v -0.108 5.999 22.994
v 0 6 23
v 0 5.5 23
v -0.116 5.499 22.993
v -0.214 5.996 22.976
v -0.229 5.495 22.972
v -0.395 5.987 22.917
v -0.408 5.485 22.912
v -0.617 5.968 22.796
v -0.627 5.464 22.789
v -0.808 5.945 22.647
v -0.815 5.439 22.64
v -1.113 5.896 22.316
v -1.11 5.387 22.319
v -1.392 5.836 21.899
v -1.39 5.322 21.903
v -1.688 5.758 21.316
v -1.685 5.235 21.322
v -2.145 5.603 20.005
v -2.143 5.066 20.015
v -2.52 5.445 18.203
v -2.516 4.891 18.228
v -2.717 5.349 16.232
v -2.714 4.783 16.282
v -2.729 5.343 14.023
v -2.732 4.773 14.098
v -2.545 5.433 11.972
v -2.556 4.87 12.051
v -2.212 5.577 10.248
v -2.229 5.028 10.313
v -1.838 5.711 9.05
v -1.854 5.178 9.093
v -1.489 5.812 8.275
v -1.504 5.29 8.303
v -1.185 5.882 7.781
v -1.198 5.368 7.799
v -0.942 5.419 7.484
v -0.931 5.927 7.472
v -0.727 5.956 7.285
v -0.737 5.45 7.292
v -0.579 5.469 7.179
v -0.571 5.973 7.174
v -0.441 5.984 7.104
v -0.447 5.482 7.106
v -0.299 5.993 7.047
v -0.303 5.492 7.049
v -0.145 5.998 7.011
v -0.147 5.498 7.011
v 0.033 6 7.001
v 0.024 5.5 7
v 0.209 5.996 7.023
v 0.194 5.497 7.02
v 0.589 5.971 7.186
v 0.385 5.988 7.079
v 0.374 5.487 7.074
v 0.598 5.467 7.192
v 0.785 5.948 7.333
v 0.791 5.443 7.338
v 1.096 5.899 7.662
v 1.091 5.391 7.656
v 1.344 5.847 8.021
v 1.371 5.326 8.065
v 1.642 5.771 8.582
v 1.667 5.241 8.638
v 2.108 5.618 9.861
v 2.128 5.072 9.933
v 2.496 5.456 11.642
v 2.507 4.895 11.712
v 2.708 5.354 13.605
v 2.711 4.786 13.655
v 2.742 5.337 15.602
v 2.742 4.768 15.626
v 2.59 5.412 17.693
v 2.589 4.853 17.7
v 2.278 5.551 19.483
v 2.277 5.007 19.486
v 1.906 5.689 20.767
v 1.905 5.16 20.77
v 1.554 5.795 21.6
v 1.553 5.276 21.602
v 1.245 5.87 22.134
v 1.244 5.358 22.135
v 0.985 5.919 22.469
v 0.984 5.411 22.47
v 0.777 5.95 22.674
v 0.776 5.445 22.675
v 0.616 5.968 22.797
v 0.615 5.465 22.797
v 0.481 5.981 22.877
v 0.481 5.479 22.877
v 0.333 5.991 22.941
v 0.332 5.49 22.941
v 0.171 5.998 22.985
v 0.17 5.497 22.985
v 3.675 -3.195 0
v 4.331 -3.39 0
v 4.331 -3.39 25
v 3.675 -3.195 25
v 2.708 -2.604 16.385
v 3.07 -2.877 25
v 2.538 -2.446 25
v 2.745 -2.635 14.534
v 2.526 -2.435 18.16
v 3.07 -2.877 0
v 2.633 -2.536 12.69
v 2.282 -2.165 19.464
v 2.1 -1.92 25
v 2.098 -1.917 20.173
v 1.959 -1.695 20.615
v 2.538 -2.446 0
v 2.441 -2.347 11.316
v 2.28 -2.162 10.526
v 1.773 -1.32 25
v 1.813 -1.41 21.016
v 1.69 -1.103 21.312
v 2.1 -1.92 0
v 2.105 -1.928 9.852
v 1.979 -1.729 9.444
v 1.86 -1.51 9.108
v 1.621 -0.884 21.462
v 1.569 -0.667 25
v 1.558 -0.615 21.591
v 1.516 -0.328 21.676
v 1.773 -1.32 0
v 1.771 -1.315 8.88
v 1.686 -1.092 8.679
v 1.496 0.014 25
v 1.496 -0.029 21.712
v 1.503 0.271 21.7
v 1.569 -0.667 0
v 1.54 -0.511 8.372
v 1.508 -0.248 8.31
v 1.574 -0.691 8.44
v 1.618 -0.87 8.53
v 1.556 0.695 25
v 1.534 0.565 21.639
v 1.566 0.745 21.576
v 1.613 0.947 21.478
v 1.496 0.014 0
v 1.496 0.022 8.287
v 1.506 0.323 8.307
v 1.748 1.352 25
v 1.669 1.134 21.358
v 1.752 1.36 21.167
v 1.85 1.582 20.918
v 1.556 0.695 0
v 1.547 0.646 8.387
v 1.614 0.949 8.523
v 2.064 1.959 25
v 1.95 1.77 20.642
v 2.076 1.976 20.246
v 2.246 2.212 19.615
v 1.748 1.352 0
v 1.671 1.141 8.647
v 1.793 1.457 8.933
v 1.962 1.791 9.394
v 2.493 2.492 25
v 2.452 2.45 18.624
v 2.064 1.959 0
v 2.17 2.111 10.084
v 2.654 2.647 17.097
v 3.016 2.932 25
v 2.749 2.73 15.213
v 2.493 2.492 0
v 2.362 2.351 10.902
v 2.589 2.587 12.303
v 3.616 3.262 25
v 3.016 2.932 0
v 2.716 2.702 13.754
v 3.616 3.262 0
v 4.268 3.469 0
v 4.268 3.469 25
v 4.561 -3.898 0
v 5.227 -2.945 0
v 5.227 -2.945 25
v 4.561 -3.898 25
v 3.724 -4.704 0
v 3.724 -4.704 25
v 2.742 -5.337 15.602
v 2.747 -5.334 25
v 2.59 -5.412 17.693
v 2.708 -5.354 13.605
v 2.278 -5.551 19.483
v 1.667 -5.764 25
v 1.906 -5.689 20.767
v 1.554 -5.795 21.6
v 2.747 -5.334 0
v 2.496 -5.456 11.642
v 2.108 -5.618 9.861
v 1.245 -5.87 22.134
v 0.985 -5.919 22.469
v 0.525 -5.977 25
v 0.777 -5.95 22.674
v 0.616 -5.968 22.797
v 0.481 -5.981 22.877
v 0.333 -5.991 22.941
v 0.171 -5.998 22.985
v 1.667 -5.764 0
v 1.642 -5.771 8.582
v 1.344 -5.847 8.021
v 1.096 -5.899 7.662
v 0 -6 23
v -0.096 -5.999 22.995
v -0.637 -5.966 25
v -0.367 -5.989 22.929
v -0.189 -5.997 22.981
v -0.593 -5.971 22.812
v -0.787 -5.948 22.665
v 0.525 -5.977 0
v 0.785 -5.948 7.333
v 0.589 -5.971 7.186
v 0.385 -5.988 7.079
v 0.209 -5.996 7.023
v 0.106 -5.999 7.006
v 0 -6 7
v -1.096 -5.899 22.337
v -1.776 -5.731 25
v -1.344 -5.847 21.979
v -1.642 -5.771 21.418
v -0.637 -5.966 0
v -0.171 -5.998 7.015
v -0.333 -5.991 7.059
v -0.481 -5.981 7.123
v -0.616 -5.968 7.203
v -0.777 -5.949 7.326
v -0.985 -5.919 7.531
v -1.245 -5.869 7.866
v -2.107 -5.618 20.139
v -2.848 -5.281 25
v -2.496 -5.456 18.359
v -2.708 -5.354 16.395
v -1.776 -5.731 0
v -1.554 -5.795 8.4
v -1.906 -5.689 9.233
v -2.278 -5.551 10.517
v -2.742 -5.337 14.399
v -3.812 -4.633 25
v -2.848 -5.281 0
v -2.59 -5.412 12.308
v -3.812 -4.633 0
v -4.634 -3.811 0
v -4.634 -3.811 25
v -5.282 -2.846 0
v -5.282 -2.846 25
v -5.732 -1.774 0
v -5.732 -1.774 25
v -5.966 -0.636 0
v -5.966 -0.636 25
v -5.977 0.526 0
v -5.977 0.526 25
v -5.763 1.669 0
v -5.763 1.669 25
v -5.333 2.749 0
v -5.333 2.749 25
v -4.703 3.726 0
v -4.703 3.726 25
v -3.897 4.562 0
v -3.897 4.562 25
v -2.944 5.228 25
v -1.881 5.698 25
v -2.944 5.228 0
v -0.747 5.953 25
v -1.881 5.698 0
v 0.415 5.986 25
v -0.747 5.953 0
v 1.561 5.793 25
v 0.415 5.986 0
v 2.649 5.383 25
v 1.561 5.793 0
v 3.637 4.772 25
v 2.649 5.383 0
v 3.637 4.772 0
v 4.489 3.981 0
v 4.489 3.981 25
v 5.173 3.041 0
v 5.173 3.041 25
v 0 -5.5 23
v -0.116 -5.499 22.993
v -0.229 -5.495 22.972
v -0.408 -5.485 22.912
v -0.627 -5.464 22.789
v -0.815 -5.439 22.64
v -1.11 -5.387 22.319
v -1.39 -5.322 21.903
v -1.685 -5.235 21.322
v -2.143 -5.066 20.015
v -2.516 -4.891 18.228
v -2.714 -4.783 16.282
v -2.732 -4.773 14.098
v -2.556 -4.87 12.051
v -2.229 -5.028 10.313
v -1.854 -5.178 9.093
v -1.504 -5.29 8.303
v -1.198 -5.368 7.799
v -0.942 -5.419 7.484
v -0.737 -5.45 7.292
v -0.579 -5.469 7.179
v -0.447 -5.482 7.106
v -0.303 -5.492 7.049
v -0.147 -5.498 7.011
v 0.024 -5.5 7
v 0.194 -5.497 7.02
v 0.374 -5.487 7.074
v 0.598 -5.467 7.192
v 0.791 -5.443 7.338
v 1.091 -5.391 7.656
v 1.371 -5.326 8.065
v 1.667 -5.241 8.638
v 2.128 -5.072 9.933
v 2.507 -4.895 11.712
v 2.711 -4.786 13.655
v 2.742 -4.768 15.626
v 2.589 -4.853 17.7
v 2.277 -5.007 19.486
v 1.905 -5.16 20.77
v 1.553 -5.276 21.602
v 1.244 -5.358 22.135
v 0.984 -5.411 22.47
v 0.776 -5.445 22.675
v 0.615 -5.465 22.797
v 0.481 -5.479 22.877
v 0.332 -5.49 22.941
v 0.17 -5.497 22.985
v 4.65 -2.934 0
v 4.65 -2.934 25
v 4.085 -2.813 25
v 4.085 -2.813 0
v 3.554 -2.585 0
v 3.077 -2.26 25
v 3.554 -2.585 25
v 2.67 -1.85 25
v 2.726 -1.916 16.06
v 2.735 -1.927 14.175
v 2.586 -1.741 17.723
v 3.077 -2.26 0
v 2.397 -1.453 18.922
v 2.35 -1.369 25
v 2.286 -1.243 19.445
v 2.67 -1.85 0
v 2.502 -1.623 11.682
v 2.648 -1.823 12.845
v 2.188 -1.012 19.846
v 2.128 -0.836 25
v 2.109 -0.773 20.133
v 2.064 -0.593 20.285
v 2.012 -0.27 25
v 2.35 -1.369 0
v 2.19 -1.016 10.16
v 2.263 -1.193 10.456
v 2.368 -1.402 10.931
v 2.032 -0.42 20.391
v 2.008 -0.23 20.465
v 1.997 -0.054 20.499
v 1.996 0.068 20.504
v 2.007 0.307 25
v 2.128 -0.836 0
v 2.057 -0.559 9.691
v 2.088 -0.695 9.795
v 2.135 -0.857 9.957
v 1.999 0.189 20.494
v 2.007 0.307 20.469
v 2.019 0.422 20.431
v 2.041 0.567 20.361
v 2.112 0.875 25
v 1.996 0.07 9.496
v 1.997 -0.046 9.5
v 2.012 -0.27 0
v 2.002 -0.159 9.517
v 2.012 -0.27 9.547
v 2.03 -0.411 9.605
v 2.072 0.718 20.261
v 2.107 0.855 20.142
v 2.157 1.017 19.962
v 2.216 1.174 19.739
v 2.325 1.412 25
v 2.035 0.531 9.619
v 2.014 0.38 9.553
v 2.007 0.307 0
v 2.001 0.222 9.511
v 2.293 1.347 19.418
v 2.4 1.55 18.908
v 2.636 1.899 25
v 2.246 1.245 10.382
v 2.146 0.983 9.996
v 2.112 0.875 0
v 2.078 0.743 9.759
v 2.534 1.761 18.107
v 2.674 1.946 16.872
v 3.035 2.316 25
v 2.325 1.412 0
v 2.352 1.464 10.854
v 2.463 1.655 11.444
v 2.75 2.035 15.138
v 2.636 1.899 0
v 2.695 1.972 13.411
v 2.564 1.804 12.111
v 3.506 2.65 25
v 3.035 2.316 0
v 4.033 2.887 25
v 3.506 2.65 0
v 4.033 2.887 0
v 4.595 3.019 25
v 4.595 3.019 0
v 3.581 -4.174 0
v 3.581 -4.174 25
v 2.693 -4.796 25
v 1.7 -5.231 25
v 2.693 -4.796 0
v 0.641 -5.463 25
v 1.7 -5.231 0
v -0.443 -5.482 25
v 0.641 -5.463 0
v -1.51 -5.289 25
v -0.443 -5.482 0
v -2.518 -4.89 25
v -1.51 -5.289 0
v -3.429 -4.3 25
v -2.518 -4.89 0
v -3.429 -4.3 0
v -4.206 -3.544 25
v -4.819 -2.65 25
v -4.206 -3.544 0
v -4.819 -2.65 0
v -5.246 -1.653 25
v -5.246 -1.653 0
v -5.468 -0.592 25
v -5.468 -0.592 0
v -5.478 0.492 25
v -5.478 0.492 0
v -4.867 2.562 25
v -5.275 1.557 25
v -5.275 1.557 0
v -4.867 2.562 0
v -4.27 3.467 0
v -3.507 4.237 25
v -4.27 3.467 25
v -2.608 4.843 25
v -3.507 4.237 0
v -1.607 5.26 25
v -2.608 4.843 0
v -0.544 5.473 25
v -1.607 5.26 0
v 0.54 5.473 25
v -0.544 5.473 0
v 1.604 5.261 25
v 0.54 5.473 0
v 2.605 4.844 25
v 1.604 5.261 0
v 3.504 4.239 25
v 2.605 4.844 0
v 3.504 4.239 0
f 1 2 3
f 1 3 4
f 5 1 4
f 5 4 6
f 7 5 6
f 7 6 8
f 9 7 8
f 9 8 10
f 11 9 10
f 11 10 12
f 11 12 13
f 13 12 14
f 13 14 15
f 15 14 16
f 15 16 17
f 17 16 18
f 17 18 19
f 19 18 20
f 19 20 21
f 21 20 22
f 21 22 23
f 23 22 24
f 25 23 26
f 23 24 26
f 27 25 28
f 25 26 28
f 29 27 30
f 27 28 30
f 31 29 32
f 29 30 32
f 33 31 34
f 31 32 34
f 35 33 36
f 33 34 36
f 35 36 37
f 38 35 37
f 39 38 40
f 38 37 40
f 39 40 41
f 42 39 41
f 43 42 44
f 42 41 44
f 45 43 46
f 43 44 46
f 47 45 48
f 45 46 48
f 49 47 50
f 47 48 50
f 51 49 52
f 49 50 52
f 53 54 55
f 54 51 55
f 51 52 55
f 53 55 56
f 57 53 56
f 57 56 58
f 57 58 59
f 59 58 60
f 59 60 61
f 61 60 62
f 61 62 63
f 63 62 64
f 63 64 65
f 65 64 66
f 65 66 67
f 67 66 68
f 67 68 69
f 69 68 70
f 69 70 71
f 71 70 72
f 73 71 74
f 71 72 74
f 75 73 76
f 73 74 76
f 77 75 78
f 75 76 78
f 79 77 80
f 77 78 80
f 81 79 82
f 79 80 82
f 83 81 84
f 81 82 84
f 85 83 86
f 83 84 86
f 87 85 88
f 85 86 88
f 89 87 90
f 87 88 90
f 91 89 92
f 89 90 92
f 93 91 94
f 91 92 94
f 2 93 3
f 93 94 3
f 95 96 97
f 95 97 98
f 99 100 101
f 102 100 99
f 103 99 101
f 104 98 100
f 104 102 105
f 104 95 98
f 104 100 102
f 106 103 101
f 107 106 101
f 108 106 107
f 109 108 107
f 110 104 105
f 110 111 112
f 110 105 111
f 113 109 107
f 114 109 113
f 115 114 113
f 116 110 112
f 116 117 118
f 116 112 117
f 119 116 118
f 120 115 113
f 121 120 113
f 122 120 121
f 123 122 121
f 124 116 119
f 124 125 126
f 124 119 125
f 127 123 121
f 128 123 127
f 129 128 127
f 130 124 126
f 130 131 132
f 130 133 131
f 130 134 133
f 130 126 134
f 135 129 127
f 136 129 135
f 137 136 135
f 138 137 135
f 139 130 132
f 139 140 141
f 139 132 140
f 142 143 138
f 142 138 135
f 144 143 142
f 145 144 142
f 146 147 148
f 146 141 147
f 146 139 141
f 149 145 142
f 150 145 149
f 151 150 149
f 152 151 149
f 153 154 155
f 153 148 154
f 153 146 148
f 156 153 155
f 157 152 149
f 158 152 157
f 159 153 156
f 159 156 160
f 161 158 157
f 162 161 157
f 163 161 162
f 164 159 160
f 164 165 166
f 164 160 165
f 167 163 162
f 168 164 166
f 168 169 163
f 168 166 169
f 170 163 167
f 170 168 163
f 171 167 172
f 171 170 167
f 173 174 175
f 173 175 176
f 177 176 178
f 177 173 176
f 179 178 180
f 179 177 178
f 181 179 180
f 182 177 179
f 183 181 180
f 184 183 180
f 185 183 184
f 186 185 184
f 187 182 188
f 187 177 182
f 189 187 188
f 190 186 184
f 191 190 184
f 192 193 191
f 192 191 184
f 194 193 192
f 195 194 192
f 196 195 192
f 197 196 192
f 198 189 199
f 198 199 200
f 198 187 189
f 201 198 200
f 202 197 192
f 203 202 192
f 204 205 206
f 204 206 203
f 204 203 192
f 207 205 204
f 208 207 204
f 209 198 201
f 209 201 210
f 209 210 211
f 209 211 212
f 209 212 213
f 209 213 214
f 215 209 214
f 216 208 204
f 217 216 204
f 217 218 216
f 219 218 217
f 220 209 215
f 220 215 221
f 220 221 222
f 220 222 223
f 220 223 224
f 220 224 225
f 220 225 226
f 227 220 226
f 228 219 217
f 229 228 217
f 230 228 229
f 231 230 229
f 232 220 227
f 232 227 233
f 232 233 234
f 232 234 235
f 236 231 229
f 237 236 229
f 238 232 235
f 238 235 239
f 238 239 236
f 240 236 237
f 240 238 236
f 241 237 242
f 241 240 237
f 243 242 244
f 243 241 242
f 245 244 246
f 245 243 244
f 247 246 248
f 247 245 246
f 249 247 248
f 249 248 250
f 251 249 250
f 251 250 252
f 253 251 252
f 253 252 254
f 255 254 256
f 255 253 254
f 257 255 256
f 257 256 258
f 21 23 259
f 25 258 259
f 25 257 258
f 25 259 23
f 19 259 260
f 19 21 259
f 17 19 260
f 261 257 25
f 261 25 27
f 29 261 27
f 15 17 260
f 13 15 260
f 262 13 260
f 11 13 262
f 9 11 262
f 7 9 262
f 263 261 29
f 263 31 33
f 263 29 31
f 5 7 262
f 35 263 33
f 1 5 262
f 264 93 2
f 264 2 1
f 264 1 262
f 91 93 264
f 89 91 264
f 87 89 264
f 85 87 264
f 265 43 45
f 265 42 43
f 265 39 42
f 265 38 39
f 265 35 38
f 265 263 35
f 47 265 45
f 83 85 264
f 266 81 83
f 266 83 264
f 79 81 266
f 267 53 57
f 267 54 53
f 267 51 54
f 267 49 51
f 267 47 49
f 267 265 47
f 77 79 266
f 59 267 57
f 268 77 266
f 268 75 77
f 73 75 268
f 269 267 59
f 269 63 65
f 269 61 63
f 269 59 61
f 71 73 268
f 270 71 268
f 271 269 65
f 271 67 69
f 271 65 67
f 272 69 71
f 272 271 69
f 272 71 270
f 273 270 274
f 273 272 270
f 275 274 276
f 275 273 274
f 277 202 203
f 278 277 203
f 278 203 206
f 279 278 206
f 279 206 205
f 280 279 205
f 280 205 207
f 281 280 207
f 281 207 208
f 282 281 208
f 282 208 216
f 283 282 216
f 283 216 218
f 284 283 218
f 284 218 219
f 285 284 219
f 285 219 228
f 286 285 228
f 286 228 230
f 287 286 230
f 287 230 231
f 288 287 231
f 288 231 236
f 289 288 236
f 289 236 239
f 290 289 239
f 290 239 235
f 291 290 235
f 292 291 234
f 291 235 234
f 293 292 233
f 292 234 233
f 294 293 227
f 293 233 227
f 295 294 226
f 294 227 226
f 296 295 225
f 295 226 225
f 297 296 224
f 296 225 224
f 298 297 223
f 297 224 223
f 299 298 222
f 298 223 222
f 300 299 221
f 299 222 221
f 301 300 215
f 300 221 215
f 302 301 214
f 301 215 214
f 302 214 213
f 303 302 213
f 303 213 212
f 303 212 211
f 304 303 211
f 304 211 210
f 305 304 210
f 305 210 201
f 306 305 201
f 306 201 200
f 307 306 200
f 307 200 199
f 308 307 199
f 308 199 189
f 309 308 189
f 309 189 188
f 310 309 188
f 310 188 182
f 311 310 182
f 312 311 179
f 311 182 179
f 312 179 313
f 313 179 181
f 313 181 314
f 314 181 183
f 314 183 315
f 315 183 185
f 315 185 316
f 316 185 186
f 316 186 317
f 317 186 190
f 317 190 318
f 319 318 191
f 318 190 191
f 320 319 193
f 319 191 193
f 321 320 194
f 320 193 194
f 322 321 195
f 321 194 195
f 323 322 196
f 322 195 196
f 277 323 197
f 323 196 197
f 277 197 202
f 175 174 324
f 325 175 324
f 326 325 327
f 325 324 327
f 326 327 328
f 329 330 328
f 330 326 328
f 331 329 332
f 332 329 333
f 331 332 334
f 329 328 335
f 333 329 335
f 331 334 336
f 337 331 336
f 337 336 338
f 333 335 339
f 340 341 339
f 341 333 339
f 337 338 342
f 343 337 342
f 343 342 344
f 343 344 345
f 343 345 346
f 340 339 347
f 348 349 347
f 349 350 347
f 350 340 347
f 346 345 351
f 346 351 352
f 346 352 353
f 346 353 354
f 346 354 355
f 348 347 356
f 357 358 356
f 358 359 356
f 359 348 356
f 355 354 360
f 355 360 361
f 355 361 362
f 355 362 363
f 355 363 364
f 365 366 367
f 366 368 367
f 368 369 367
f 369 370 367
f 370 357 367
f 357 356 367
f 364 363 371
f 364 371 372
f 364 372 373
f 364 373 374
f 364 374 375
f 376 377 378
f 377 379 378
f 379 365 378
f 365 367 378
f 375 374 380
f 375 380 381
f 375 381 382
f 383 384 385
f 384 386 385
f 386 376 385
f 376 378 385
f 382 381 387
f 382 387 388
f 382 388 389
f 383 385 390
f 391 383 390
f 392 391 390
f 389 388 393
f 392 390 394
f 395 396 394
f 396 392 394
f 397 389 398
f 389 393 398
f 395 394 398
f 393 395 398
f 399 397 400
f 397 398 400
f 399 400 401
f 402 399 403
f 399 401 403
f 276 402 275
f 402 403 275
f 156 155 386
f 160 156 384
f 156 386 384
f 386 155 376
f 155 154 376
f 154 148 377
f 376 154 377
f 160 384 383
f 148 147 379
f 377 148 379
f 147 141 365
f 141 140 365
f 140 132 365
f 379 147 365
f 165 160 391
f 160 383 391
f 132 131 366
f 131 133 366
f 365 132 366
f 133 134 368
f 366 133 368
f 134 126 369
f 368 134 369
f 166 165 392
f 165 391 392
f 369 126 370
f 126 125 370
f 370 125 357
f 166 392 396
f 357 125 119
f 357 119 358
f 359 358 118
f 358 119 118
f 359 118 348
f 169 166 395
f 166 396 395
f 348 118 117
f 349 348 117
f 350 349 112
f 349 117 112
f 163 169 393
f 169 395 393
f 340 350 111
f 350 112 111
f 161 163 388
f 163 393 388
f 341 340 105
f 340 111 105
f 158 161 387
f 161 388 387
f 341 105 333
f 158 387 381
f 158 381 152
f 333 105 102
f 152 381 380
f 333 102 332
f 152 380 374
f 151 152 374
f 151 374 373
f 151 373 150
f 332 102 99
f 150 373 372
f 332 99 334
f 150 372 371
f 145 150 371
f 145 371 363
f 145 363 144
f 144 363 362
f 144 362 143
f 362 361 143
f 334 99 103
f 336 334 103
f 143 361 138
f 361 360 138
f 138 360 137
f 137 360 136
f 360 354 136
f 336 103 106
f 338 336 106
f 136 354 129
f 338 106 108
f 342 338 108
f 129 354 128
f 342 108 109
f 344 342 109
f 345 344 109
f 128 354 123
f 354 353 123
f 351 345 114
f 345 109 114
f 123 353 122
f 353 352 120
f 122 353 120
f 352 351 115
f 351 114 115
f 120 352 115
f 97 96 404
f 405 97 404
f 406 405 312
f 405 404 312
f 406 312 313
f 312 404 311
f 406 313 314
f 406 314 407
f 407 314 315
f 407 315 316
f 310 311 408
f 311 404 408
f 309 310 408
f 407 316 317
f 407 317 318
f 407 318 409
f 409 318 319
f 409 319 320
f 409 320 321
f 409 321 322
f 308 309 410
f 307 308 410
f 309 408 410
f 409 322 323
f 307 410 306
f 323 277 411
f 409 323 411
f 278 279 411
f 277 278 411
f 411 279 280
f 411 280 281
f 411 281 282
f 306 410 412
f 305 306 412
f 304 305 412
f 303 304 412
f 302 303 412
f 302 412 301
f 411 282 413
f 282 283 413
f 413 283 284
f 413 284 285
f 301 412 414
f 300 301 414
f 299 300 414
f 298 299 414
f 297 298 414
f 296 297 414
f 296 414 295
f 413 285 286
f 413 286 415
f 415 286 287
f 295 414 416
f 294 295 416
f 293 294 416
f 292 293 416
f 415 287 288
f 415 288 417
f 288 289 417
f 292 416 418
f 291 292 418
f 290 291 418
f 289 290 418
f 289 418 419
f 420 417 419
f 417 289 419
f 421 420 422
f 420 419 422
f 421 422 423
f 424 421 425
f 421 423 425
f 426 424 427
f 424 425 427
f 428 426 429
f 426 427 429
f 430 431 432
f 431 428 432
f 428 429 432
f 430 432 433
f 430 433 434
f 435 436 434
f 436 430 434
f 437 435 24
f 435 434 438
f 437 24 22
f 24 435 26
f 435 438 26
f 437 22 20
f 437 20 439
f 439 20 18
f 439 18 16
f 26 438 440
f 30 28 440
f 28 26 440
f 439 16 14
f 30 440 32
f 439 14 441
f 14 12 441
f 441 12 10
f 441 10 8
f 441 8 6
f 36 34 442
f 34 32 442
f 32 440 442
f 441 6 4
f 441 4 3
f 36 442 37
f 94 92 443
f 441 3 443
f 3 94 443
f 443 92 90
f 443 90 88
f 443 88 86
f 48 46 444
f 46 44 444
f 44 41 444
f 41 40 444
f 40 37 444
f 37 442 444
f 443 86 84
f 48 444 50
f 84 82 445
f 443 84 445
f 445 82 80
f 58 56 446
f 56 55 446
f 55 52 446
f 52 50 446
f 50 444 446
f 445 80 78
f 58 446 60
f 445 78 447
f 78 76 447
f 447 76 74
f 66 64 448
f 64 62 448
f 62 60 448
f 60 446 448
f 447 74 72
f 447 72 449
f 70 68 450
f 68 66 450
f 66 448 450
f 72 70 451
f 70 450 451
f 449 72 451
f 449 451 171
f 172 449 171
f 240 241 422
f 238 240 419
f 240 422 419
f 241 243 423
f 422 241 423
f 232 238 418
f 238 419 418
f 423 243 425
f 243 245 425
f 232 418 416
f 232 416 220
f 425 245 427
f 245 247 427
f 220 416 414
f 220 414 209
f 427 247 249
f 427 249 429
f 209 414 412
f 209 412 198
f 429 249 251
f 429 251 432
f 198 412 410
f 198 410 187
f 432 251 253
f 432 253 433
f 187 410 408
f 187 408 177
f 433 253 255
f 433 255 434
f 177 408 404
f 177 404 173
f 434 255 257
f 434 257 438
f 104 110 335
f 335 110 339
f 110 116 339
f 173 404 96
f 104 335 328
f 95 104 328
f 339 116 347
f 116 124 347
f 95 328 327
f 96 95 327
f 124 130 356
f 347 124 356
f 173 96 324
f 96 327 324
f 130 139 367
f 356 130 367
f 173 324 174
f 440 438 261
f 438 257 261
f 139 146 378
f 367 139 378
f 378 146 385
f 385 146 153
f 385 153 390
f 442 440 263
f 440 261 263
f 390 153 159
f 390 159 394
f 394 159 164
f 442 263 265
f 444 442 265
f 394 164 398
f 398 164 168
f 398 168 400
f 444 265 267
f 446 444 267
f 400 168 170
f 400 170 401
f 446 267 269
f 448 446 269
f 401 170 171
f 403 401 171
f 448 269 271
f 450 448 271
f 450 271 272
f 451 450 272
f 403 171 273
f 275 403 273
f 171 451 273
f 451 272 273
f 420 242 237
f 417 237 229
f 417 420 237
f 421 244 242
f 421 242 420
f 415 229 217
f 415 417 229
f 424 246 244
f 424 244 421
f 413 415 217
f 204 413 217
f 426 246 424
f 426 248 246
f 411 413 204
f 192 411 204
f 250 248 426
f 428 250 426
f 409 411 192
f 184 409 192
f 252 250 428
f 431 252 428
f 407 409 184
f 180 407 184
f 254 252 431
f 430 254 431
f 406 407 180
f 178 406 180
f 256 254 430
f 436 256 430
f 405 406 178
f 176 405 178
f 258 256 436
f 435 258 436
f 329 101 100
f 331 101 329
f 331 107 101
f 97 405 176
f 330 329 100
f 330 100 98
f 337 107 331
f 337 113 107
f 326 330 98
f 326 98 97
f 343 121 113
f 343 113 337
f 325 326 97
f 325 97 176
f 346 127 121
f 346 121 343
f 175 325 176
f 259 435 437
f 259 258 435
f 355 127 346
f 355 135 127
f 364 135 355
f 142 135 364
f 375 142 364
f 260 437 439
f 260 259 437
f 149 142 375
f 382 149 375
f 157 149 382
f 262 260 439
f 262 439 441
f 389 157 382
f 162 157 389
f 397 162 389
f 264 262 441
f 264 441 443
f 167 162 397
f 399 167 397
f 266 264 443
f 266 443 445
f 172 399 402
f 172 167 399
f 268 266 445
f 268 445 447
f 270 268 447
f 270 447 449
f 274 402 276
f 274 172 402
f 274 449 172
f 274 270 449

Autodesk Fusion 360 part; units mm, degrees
sketch "Sketch1" plane through (0, 0, 0) normal (0, 0, 1) x (1, 0, 0)
  circle A0 centre (0, 0) radius 6
  circle A1 centre (0, 0) radius 5.5
  circle A2 centre (4.9955, 0.0458) radius 3
  circle A3 centre (4.9955, 0.0458) radius 3.5
  dimension "d1" = 12
  dimension "d2" = 11
  dimension "d4" = 6
  dimension "d5" = 7
extrude "Extrude1" add sketch "Sketch1" along normal blind 25 contours A0 A1 A2 A3 | A0 A1 A2 A3 | A0 A1 A3 | A1 A2 A3
ref_plane "WorkPlane1" through (0, -6, 10.4032) normal (0, -1, 0) x (-1, 0, 0)
sketch "Sketch2" plane through (0, -6, 0) normal (0, -1, 0) x (-1, 0, 0)
  ellipse E0 centre (0, -15) end of major axis (0, -23) minor radius 2.75
  line L0 (0, -7) -> (0, -23) construction
  line L1 (-2.75, -15) -> (2.75, -15) construction
  dimension "d9" = 5.5
extrude "Extrude2" cut sketch "Sketch2" against normal blind 20
sketch "Sketch3" plane through (0, 0, 0) normal (0, 0, 1) x (1, 0, 0)
  line L0 (-63, 9) -> (-37, 9)
  line L1 (-37, 9) -> (-37, -12)
  line L2 (-37, -12) -> (-63, -12)
  line L3 (-63, -12) -> (-63, 9)
extrude "Extrude3" [suppressed]
sketch "Sketch4" plane through (0, -12, 0) normal (0, -1, 0) x (1, 0, 0)
  line L0 (-63, 0) -> (-37, 0)
  line L1 (-37, 0) -> (-37, 47)
  line L2 (-37, 47) -> (-63, 47)
  line L3 (-63, 47) -> (-63, 0)
  circle A0 centre (-54, 23) radius 2
  circle A1 centre (-54, 32) radius 2
  dimension "d14" = 4
  dimension "d15" = 4
  dimension "d16" = 9
  dimension "d17" = 15
  dimension "d18" = 23
equation "d2 = d1 - 1 mm"
